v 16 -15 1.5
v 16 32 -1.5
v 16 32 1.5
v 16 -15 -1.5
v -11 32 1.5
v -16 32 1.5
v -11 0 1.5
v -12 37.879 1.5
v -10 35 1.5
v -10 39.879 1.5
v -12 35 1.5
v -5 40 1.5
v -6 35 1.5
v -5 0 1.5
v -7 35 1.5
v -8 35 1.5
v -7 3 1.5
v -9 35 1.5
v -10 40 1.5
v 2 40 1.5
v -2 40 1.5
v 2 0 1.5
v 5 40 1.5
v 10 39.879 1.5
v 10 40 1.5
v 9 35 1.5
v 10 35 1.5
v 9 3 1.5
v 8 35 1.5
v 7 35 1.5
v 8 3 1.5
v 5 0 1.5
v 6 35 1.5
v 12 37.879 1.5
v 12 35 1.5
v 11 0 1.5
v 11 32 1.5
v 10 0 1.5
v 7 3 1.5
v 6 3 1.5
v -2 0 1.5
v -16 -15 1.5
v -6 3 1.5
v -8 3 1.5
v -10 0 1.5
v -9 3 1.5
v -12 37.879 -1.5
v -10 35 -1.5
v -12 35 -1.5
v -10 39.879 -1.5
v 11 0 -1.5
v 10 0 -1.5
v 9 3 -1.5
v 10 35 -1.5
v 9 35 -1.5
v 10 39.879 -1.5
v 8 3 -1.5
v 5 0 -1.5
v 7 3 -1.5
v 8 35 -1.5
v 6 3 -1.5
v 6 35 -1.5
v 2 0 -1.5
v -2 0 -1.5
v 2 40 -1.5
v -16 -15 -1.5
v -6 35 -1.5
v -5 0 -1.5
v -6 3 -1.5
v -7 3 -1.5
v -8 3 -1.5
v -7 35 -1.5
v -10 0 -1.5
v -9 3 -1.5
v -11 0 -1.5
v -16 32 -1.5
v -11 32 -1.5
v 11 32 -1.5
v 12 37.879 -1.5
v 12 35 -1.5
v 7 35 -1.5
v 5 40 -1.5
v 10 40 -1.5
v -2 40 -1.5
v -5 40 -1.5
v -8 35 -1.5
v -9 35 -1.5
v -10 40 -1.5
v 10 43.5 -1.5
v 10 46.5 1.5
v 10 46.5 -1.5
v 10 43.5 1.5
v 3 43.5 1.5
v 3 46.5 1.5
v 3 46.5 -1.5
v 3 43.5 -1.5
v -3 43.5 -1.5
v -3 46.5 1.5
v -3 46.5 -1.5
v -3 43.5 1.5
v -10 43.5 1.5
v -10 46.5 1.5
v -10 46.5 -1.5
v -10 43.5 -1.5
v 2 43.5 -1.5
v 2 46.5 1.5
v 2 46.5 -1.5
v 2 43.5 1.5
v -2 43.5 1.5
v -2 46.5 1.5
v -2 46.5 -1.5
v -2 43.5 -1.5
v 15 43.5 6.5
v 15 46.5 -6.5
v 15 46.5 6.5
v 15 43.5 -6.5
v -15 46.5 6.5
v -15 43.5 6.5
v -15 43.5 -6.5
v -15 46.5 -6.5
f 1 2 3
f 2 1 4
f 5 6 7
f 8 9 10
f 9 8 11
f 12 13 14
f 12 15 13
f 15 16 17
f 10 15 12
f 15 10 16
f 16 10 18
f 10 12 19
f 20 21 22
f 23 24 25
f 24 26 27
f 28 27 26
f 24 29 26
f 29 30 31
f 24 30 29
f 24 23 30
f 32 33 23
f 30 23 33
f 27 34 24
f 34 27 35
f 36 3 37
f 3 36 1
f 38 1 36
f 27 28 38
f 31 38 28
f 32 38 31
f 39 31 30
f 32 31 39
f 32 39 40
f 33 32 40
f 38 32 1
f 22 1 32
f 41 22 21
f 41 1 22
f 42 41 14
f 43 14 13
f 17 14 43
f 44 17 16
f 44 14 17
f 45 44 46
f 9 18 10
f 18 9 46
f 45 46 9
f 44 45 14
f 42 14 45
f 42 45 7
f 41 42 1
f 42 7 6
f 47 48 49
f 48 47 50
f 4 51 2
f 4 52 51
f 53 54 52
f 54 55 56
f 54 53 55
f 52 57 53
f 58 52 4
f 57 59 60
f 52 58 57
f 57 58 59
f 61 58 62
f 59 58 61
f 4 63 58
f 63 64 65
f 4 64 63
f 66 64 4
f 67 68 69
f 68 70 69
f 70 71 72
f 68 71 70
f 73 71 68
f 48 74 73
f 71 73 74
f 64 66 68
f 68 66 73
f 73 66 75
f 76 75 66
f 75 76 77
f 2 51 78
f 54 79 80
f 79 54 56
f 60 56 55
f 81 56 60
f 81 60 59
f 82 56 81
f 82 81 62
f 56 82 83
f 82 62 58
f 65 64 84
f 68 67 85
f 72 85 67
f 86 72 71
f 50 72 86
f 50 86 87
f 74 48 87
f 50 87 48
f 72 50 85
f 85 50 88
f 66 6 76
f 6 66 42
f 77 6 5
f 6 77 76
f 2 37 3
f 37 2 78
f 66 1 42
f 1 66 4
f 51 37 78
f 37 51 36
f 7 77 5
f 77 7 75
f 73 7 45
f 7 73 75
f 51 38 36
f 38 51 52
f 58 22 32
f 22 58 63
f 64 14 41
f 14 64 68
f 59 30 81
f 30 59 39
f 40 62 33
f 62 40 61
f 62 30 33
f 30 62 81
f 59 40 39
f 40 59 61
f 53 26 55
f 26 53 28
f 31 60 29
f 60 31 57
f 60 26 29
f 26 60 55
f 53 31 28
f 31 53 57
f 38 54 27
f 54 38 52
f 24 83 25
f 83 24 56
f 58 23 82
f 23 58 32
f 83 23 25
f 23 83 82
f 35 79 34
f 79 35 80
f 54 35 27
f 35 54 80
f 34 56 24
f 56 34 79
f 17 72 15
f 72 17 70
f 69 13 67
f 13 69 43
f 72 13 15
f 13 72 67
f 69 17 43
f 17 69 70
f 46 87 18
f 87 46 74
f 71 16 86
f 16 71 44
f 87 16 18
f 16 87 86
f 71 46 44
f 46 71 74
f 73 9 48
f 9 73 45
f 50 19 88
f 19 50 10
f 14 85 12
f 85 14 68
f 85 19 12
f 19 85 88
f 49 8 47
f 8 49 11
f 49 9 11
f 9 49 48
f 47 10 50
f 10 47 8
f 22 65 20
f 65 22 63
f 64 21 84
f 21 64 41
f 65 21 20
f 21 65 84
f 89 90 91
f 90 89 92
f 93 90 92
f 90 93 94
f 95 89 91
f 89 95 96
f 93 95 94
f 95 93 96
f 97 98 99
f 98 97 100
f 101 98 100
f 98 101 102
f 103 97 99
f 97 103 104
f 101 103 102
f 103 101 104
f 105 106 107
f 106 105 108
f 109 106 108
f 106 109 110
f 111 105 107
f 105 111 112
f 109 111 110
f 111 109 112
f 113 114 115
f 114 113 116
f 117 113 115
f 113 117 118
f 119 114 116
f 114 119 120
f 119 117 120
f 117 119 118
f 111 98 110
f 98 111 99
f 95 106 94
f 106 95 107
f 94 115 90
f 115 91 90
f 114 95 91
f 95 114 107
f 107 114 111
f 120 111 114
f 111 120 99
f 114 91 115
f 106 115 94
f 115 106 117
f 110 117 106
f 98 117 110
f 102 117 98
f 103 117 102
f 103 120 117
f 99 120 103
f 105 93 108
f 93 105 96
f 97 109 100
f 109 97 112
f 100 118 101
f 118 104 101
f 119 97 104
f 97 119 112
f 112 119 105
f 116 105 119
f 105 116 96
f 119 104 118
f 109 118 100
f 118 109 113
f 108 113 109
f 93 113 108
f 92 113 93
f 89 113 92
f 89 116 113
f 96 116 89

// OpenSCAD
// file: snap-feather.scad
material_z = 3;
nothing = 0.01;

module snap_feather(
            width,
            height,
            hook_width,
            hook_height,
            hook_cutaway,
            leg_count=3,
            base_height
            )
{
    // feather leg(s)
    difference()
    {
        translate([
            width/2,
            height/2,
            0
            ])
        cube([
            width,
            height,
            material_z
            ], center=true);
        
        leg_width = width/(2*leg_count-1);
        leg_height = height - hook_height - base_height;
        for (i=[1:leg_count-1])
        {
            translate([
                leg_width/2 + (i*2-1)*leg_width,
                leg_height/2 + base_height,
                0
                ])
            cube([
                leg_width,
                leg_height,
                material_z + 2*nothing
                ], center=true);
        }
    }

    // feather head
    translate([
        width + hook_width/2,
        height - hook_height/2,
        0
        ])
    difference()
    {
        cube([
            hook_width,
            hook_height,
            material_z
            ], center=true);
        
        // cut away a corner
        translate([
            hook_width/2,
            hook_height/2,
            0
            ])
        rotate(45)
        cube([
            hook_cutaway,
            hook_cutaway,
            material_z + 2*nothing
            ], center=true);
    }
}

snap_feather(
    width=5,
    height=40,
    hook_width=3,
    hook_height=5,
    hook_cutaway=4,
    leg_width=2,
    leg_count=3,
    base_height=3
    );
// file: snap-nut.scad
include <config.scad>;

module snap_nut_cutout(
            width = snap_joint_width,
            feather_width = snap_joint_feather_width,
            feather_hook_width = snap_joint_feather_hook_width,
            stick_width = snap_joint_stick_width
            )
{
    translate([
        width/2 - feather_width/2 - feather_hook_width/2,
        0,
        0
        ])
    cube([
        feather_width + feather_hook_width,
        material_z*2,
        material_z
        ], center=true);

    translate([
        -width/2 + feather_width/2 + feather_hook_width/2,
        0,
        0
        ])
    cube([
        feather_width + feather_hook_width,
        material_z*2,
        material_z
        ], center=true);

    cube([
        stick_width,
        material_z*2,
        material_z
        ], center=true);
}

snap_nut_cutout();
// file: snap-joint.scad
include <config.scad>;
use <snap-feather.scad>;

module snap_joint(
            width = snap_joint_width,
            height = snap_joint_height,
            feather_width = snap_joint_feather_width,
            feather_hook_width = snap_joint_feather_hook_width,
            feather_hook_height = snap_joint_feather_hook_height,
            feather_hook_cutaway = snap_joint_feather_hook_cutaway,
            feather_base_height = snap_joint_feather_base_height,
            stick_width = snap_joint_stick_width
            )
{
    translate([width/2 - feather_width, 0, 0])
    snap_feather(
        width = feather_width,
        height = height,
        hook_width = feather_hook_width,
        hook_height = feather_hook_height,
        hook_cutaway  = feather_hook_cutaway,
        base_height = feather_base_height
        );

    translate([-width/2 + feather_width, 0, 0])
    rotate([0, 180, 0])
    snap_feather(
        width = feather_width,
        height = height,
        hook_width = feather_hook_width,
        hook_height = feather_hook_height,
        hook_cutaway  = feather_hook_cutaway,
        base_height = feather_base_height
        );

    translate([0, height/2, 0])
    cube([stick_width, height, material_z], center=true);
}

snap_joint();
// file: config.scad
$fn = 50;
nothing = 0.01;

material_z = 3;

snap_joint_width = 20;
snap_joint_height = 40;
snap_joint_feather_width = 5;
snap_joint_feather_hook_width = 2;
snap_joint_feather_hook_height = 5;
snap_joint_feather_hook_cutaway = 3;
snap_joint_feather_base_height = 3;
snap_joint_stick_width = 4;
// main file
include <config.scad>;
use <snap-joint.scad>;
use <snap-nut.scad>;

difference()
{
    y = snap_joint_height - material_z;
    translate([0, y/2 - 10, 0])
    cube([
        snap_joint_width + snap_joint_feather_hook_width + 10,
        y + 10,
        material_z
        ], center=true);

    translate([0, y/2, 0])
    cube([
        snap_joint_width + 2,
        y,
        material_z + nothing
        ], center=true);
}
snap_joint();

translate([0, snap_joint_height+5, 0])
difference()
{
    cube([
        snap_joint_width + 10,
        material_z,
        material_z + 10
        ], center=true);
    snap_nut_cutout();
}
